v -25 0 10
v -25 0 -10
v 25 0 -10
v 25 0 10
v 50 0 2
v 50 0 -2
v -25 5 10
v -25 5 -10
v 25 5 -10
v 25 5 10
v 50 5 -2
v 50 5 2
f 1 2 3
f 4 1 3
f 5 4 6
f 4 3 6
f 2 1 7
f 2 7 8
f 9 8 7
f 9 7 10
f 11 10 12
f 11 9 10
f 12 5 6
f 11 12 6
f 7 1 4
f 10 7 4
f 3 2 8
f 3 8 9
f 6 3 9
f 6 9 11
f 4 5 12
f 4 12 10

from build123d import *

# Parameters (mm, degrees)
CROQUIS1_W              = 50
CROQUIS1_H              = 20
SALIENTE_EXTRUIR1_DEPTH = 5


with BuildPart() as part:
    # Croquis1 → Saliente-Extruir1 (new body)
    with BuildSketch(Plane(origin=(0, 0, 0), x_dir=(1, 0, 0), z_dir=(0, 1, 0))):
        Rectangle(CROQUIS1_W, CROQUIS1_H)
        Polygon((25, 10), (50, 2), (50, 0), (50, -2), (25, -10), align=None)
    extrude(amount=SALIENTE_EXTRUIR1_DEPTH)


solid = part.part
